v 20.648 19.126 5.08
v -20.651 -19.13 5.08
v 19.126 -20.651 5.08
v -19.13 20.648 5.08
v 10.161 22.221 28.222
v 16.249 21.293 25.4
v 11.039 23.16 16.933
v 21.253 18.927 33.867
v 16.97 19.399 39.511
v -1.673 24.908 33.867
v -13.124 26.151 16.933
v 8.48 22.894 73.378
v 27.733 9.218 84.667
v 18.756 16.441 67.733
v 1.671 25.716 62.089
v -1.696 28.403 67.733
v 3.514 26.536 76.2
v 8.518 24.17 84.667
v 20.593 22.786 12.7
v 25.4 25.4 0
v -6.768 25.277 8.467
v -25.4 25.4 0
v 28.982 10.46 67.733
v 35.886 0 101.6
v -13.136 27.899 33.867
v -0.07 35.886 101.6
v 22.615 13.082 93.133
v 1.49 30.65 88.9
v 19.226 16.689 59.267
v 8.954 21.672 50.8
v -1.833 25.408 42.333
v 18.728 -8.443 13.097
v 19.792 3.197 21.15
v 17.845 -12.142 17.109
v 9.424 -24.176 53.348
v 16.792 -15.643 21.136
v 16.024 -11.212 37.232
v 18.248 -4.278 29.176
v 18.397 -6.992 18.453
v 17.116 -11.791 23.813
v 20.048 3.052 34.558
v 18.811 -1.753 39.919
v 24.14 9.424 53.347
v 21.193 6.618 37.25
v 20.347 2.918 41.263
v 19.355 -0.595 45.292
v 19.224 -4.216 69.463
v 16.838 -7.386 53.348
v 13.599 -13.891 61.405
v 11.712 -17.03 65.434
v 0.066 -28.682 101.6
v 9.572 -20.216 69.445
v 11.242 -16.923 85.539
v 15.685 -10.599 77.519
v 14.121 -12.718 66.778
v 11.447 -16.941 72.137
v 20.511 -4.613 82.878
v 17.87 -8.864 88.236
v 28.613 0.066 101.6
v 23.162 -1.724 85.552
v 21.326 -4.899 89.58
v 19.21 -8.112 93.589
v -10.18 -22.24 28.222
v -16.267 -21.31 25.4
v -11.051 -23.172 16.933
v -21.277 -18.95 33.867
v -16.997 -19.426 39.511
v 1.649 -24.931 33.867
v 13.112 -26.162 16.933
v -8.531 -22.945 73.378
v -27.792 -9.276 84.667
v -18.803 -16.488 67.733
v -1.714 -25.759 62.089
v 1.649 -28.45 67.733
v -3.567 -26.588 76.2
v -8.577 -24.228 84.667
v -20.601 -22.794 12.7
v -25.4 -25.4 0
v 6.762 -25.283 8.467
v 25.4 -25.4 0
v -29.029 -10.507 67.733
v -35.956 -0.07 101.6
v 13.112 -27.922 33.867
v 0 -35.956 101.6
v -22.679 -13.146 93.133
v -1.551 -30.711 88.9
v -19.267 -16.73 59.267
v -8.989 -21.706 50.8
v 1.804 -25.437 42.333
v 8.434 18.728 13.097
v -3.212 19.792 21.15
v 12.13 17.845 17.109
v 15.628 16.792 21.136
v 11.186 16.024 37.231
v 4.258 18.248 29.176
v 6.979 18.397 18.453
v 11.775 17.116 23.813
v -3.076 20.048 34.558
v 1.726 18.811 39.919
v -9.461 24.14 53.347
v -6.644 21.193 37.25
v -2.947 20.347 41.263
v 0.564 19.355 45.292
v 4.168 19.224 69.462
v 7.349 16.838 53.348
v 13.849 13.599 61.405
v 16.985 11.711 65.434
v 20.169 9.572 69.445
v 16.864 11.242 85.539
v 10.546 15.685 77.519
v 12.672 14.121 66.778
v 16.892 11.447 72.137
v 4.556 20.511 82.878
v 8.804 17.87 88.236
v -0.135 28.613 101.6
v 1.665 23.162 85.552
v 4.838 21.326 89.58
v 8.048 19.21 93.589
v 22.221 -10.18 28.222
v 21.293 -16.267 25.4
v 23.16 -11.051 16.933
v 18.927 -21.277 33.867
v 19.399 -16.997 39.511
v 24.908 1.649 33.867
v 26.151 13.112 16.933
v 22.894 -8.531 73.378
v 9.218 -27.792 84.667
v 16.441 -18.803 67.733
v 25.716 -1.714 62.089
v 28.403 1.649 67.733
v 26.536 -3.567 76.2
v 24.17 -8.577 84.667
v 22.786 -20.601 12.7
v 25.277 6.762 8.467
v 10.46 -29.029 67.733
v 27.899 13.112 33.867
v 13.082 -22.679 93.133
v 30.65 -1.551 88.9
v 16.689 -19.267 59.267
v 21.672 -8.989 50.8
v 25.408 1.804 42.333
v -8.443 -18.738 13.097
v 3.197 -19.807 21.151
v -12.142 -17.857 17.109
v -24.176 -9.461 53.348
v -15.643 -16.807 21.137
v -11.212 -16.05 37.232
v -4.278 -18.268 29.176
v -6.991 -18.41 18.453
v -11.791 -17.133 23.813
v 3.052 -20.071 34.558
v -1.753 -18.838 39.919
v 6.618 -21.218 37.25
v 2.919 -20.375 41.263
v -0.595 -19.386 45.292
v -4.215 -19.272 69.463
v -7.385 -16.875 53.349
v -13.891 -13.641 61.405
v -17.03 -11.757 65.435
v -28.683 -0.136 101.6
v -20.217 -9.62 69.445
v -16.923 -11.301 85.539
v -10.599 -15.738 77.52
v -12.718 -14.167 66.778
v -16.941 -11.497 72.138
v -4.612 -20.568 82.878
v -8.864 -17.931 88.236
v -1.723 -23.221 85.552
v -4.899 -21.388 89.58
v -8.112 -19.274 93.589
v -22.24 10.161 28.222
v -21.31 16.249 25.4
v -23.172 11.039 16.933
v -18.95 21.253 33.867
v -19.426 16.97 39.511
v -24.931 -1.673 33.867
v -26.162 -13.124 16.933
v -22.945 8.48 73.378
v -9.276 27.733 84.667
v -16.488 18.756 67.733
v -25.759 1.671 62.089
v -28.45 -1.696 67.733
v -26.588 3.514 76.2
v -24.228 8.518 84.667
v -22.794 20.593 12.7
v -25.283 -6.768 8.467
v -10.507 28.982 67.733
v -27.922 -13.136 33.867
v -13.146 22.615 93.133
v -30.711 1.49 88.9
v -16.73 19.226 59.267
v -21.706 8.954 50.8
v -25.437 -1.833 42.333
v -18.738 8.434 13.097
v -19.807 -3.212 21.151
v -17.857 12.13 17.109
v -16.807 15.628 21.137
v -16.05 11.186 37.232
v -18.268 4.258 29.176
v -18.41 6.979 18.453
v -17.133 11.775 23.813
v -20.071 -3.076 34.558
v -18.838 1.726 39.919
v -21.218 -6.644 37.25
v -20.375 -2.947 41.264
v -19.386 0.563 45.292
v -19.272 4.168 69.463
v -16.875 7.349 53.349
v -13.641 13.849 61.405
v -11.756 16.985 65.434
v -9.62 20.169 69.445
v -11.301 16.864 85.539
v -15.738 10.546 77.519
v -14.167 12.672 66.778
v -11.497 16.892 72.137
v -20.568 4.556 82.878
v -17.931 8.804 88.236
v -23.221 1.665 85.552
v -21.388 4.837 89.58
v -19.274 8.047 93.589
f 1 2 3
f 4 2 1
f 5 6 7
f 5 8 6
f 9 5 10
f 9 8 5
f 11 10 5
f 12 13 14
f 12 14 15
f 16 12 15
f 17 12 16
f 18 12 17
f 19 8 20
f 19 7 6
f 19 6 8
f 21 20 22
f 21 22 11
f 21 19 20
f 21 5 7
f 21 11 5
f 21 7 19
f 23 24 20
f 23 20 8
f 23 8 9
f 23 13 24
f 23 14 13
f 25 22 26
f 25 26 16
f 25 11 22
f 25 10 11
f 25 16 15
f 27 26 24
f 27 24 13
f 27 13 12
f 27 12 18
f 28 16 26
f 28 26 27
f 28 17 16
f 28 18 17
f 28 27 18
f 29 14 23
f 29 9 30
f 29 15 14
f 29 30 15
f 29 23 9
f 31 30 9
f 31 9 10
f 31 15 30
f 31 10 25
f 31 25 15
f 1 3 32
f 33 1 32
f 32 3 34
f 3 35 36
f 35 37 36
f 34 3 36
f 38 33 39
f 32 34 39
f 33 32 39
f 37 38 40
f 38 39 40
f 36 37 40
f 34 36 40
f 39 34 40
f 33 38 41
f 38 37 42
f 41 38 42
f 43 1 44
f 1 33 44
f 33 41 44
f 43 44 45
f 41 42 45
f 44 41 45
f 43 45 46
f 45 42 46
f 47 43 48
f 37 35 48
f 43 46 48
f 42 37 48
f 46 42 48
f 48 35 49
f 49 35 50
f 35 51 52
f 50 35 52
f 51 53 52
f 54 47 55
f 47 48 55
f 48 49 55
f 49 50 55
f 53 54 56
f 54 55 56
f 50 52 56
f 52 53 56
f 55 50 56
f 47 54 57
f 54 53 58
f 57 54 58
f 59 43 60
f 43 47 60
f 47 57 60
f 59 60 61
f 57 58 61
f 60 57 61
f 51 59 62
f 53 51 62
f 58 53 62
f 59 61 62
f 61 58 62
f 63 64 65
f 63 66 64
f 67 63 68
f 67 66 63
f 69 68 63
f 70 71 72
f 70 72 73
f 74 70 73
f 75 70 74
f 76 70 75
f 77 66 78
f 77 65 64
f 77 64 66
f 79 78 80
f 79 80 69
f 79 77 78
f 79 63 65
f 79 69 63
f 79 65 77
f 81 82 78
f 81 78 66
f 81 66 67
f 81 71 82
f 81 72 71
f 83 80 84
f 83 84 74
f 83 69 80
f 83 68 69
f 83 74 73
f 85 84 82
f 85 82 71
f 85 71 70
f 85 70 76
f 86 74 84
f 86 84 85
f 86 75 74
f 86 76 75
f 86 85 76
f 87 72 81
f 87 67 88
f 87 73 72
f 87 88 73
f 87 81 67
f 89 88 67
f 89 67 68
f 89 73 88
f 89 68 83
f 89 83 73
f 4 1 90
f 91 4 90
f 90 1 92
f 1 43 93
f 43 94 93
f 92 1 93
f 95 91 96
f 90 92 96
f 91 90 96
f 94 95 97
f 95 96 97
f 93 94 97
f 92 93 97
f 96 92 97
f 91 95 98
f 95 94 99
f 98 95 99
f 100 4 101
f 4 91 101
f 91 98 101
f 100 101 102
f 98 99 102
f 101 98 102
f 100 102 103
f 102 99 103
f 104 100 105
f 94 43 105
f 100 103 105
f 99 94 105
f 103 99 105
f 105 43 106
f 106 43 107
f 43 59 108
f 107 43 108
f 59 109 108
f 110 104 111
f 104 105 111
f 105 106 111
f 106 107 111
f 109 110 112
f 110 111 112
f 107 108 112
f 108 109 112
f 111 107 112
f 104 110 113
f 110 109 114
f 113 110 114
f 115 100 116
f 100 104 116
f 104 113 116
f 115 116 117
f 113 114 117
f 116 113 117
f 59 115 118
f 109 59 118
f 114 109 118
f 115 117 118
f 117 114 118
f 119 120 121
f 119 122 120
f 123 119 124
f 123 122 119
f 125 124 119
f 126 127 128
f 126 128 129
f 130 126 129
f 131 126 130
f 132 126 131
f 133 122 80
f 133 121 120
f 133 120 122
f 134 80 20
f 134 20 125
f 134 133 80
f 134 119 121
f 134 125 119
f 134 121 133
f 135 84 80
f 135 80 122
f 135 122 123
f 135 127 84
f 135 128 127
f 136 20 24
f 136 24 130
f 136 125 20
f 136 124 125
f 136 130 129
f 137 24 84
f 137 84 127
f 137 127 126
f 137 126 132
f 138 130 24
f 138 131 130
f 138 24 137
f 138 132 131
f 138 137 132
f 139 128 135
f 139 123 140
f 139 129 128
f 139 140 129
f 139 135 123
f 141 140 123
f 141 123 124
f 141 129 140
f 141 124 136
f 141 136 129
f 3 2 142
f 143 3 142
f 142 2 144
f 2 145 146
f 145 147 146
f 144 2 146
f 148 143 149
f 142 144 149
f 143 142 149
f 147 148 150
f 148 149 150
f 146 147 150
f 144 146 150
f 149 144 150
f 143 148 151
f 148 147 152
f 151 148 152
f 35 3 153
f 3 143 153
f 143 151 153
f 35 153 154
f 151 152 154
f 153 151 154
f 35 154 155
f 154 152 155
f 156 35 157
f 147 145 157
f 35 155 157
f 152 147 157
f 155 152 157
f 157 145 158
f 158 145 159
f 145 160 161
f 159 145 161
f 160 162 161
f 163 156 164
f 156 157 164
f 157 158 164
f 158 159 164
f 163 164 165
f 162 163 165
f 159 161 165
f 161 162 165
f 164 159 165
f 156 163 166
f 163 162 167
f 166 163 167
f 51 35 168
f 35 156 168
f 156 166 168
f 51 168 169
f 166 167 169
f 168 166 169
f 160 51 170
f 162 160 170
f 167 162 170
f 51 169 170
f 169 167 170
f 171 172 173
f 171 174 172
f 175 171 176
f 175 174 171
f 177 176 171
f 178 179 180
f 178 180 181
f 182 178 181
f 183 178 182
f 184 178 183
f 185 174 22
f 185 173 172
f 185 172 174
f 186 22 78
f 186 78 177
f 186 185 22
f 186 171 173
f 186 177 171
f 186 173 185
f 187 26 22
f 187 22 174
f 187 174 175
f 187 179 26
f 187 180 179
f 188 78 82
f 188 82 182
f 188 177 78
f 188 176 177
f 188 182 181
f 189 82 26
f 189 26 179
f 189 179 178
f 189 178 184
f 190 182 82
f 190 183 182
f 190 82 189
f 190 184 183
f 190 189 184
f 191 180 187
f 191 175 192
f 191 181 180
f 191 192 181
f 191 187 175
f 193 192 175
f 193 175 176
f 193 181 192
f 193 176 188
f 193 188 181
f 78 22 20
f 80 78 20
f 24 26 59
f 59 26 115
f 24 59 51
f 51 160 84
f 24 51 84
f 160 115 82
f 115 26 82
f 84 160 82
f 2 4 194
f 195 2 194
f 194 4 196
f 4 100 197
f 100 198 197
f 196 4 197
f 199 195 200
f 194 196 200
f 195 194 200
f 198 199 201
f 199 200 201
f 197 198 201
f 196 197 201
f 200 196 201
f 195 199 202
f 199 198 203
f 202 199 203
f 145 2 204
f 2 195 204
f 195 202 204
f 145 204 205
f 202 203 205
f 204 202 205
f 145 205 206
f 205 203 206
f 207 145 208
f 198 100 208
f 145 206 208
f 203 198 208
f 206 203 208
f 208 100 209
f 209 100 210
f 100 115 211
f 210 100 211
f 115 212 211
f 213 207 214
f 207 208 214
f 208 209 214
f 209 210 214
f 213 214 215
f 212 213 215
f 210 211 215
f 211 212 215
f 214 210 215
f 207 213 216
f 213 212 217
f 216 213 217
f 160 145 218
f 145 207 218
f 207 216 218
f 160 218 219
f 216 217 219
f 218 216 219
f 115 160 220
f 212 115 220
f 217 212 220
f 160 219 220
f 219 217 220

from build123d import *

# Parameters (mm, degrees)
F0_W = 50.8
F0_H = 50.8
F4_T = -5.08


with BuildPart() as f3:
    # F0 (on Top) → F3 section 0
    with BuildSketch(Plane.XY):
        Rectangle(F0_W, F0_H)
    # F2 (on offset) → F3 section 1
    with BuildSketch(Plane.XY.offset(101.6)):
        Polygon((-0.0698438989, 35.8860855595), (-35.9559294584, -0.0698438989), (0, -35.9559294584), (35.8860855595, 0), align=None)
    loft()

    # F4
    f4_openings = [f3.faces().sort_by_distance(p)[0] for p in [
        (-0.034922, -0.034922, 101.6),
    ]]
    offset(amount=F4_T, openings=f4_openings, kind=Kind.INTERSECTION)


solid = f3.part
